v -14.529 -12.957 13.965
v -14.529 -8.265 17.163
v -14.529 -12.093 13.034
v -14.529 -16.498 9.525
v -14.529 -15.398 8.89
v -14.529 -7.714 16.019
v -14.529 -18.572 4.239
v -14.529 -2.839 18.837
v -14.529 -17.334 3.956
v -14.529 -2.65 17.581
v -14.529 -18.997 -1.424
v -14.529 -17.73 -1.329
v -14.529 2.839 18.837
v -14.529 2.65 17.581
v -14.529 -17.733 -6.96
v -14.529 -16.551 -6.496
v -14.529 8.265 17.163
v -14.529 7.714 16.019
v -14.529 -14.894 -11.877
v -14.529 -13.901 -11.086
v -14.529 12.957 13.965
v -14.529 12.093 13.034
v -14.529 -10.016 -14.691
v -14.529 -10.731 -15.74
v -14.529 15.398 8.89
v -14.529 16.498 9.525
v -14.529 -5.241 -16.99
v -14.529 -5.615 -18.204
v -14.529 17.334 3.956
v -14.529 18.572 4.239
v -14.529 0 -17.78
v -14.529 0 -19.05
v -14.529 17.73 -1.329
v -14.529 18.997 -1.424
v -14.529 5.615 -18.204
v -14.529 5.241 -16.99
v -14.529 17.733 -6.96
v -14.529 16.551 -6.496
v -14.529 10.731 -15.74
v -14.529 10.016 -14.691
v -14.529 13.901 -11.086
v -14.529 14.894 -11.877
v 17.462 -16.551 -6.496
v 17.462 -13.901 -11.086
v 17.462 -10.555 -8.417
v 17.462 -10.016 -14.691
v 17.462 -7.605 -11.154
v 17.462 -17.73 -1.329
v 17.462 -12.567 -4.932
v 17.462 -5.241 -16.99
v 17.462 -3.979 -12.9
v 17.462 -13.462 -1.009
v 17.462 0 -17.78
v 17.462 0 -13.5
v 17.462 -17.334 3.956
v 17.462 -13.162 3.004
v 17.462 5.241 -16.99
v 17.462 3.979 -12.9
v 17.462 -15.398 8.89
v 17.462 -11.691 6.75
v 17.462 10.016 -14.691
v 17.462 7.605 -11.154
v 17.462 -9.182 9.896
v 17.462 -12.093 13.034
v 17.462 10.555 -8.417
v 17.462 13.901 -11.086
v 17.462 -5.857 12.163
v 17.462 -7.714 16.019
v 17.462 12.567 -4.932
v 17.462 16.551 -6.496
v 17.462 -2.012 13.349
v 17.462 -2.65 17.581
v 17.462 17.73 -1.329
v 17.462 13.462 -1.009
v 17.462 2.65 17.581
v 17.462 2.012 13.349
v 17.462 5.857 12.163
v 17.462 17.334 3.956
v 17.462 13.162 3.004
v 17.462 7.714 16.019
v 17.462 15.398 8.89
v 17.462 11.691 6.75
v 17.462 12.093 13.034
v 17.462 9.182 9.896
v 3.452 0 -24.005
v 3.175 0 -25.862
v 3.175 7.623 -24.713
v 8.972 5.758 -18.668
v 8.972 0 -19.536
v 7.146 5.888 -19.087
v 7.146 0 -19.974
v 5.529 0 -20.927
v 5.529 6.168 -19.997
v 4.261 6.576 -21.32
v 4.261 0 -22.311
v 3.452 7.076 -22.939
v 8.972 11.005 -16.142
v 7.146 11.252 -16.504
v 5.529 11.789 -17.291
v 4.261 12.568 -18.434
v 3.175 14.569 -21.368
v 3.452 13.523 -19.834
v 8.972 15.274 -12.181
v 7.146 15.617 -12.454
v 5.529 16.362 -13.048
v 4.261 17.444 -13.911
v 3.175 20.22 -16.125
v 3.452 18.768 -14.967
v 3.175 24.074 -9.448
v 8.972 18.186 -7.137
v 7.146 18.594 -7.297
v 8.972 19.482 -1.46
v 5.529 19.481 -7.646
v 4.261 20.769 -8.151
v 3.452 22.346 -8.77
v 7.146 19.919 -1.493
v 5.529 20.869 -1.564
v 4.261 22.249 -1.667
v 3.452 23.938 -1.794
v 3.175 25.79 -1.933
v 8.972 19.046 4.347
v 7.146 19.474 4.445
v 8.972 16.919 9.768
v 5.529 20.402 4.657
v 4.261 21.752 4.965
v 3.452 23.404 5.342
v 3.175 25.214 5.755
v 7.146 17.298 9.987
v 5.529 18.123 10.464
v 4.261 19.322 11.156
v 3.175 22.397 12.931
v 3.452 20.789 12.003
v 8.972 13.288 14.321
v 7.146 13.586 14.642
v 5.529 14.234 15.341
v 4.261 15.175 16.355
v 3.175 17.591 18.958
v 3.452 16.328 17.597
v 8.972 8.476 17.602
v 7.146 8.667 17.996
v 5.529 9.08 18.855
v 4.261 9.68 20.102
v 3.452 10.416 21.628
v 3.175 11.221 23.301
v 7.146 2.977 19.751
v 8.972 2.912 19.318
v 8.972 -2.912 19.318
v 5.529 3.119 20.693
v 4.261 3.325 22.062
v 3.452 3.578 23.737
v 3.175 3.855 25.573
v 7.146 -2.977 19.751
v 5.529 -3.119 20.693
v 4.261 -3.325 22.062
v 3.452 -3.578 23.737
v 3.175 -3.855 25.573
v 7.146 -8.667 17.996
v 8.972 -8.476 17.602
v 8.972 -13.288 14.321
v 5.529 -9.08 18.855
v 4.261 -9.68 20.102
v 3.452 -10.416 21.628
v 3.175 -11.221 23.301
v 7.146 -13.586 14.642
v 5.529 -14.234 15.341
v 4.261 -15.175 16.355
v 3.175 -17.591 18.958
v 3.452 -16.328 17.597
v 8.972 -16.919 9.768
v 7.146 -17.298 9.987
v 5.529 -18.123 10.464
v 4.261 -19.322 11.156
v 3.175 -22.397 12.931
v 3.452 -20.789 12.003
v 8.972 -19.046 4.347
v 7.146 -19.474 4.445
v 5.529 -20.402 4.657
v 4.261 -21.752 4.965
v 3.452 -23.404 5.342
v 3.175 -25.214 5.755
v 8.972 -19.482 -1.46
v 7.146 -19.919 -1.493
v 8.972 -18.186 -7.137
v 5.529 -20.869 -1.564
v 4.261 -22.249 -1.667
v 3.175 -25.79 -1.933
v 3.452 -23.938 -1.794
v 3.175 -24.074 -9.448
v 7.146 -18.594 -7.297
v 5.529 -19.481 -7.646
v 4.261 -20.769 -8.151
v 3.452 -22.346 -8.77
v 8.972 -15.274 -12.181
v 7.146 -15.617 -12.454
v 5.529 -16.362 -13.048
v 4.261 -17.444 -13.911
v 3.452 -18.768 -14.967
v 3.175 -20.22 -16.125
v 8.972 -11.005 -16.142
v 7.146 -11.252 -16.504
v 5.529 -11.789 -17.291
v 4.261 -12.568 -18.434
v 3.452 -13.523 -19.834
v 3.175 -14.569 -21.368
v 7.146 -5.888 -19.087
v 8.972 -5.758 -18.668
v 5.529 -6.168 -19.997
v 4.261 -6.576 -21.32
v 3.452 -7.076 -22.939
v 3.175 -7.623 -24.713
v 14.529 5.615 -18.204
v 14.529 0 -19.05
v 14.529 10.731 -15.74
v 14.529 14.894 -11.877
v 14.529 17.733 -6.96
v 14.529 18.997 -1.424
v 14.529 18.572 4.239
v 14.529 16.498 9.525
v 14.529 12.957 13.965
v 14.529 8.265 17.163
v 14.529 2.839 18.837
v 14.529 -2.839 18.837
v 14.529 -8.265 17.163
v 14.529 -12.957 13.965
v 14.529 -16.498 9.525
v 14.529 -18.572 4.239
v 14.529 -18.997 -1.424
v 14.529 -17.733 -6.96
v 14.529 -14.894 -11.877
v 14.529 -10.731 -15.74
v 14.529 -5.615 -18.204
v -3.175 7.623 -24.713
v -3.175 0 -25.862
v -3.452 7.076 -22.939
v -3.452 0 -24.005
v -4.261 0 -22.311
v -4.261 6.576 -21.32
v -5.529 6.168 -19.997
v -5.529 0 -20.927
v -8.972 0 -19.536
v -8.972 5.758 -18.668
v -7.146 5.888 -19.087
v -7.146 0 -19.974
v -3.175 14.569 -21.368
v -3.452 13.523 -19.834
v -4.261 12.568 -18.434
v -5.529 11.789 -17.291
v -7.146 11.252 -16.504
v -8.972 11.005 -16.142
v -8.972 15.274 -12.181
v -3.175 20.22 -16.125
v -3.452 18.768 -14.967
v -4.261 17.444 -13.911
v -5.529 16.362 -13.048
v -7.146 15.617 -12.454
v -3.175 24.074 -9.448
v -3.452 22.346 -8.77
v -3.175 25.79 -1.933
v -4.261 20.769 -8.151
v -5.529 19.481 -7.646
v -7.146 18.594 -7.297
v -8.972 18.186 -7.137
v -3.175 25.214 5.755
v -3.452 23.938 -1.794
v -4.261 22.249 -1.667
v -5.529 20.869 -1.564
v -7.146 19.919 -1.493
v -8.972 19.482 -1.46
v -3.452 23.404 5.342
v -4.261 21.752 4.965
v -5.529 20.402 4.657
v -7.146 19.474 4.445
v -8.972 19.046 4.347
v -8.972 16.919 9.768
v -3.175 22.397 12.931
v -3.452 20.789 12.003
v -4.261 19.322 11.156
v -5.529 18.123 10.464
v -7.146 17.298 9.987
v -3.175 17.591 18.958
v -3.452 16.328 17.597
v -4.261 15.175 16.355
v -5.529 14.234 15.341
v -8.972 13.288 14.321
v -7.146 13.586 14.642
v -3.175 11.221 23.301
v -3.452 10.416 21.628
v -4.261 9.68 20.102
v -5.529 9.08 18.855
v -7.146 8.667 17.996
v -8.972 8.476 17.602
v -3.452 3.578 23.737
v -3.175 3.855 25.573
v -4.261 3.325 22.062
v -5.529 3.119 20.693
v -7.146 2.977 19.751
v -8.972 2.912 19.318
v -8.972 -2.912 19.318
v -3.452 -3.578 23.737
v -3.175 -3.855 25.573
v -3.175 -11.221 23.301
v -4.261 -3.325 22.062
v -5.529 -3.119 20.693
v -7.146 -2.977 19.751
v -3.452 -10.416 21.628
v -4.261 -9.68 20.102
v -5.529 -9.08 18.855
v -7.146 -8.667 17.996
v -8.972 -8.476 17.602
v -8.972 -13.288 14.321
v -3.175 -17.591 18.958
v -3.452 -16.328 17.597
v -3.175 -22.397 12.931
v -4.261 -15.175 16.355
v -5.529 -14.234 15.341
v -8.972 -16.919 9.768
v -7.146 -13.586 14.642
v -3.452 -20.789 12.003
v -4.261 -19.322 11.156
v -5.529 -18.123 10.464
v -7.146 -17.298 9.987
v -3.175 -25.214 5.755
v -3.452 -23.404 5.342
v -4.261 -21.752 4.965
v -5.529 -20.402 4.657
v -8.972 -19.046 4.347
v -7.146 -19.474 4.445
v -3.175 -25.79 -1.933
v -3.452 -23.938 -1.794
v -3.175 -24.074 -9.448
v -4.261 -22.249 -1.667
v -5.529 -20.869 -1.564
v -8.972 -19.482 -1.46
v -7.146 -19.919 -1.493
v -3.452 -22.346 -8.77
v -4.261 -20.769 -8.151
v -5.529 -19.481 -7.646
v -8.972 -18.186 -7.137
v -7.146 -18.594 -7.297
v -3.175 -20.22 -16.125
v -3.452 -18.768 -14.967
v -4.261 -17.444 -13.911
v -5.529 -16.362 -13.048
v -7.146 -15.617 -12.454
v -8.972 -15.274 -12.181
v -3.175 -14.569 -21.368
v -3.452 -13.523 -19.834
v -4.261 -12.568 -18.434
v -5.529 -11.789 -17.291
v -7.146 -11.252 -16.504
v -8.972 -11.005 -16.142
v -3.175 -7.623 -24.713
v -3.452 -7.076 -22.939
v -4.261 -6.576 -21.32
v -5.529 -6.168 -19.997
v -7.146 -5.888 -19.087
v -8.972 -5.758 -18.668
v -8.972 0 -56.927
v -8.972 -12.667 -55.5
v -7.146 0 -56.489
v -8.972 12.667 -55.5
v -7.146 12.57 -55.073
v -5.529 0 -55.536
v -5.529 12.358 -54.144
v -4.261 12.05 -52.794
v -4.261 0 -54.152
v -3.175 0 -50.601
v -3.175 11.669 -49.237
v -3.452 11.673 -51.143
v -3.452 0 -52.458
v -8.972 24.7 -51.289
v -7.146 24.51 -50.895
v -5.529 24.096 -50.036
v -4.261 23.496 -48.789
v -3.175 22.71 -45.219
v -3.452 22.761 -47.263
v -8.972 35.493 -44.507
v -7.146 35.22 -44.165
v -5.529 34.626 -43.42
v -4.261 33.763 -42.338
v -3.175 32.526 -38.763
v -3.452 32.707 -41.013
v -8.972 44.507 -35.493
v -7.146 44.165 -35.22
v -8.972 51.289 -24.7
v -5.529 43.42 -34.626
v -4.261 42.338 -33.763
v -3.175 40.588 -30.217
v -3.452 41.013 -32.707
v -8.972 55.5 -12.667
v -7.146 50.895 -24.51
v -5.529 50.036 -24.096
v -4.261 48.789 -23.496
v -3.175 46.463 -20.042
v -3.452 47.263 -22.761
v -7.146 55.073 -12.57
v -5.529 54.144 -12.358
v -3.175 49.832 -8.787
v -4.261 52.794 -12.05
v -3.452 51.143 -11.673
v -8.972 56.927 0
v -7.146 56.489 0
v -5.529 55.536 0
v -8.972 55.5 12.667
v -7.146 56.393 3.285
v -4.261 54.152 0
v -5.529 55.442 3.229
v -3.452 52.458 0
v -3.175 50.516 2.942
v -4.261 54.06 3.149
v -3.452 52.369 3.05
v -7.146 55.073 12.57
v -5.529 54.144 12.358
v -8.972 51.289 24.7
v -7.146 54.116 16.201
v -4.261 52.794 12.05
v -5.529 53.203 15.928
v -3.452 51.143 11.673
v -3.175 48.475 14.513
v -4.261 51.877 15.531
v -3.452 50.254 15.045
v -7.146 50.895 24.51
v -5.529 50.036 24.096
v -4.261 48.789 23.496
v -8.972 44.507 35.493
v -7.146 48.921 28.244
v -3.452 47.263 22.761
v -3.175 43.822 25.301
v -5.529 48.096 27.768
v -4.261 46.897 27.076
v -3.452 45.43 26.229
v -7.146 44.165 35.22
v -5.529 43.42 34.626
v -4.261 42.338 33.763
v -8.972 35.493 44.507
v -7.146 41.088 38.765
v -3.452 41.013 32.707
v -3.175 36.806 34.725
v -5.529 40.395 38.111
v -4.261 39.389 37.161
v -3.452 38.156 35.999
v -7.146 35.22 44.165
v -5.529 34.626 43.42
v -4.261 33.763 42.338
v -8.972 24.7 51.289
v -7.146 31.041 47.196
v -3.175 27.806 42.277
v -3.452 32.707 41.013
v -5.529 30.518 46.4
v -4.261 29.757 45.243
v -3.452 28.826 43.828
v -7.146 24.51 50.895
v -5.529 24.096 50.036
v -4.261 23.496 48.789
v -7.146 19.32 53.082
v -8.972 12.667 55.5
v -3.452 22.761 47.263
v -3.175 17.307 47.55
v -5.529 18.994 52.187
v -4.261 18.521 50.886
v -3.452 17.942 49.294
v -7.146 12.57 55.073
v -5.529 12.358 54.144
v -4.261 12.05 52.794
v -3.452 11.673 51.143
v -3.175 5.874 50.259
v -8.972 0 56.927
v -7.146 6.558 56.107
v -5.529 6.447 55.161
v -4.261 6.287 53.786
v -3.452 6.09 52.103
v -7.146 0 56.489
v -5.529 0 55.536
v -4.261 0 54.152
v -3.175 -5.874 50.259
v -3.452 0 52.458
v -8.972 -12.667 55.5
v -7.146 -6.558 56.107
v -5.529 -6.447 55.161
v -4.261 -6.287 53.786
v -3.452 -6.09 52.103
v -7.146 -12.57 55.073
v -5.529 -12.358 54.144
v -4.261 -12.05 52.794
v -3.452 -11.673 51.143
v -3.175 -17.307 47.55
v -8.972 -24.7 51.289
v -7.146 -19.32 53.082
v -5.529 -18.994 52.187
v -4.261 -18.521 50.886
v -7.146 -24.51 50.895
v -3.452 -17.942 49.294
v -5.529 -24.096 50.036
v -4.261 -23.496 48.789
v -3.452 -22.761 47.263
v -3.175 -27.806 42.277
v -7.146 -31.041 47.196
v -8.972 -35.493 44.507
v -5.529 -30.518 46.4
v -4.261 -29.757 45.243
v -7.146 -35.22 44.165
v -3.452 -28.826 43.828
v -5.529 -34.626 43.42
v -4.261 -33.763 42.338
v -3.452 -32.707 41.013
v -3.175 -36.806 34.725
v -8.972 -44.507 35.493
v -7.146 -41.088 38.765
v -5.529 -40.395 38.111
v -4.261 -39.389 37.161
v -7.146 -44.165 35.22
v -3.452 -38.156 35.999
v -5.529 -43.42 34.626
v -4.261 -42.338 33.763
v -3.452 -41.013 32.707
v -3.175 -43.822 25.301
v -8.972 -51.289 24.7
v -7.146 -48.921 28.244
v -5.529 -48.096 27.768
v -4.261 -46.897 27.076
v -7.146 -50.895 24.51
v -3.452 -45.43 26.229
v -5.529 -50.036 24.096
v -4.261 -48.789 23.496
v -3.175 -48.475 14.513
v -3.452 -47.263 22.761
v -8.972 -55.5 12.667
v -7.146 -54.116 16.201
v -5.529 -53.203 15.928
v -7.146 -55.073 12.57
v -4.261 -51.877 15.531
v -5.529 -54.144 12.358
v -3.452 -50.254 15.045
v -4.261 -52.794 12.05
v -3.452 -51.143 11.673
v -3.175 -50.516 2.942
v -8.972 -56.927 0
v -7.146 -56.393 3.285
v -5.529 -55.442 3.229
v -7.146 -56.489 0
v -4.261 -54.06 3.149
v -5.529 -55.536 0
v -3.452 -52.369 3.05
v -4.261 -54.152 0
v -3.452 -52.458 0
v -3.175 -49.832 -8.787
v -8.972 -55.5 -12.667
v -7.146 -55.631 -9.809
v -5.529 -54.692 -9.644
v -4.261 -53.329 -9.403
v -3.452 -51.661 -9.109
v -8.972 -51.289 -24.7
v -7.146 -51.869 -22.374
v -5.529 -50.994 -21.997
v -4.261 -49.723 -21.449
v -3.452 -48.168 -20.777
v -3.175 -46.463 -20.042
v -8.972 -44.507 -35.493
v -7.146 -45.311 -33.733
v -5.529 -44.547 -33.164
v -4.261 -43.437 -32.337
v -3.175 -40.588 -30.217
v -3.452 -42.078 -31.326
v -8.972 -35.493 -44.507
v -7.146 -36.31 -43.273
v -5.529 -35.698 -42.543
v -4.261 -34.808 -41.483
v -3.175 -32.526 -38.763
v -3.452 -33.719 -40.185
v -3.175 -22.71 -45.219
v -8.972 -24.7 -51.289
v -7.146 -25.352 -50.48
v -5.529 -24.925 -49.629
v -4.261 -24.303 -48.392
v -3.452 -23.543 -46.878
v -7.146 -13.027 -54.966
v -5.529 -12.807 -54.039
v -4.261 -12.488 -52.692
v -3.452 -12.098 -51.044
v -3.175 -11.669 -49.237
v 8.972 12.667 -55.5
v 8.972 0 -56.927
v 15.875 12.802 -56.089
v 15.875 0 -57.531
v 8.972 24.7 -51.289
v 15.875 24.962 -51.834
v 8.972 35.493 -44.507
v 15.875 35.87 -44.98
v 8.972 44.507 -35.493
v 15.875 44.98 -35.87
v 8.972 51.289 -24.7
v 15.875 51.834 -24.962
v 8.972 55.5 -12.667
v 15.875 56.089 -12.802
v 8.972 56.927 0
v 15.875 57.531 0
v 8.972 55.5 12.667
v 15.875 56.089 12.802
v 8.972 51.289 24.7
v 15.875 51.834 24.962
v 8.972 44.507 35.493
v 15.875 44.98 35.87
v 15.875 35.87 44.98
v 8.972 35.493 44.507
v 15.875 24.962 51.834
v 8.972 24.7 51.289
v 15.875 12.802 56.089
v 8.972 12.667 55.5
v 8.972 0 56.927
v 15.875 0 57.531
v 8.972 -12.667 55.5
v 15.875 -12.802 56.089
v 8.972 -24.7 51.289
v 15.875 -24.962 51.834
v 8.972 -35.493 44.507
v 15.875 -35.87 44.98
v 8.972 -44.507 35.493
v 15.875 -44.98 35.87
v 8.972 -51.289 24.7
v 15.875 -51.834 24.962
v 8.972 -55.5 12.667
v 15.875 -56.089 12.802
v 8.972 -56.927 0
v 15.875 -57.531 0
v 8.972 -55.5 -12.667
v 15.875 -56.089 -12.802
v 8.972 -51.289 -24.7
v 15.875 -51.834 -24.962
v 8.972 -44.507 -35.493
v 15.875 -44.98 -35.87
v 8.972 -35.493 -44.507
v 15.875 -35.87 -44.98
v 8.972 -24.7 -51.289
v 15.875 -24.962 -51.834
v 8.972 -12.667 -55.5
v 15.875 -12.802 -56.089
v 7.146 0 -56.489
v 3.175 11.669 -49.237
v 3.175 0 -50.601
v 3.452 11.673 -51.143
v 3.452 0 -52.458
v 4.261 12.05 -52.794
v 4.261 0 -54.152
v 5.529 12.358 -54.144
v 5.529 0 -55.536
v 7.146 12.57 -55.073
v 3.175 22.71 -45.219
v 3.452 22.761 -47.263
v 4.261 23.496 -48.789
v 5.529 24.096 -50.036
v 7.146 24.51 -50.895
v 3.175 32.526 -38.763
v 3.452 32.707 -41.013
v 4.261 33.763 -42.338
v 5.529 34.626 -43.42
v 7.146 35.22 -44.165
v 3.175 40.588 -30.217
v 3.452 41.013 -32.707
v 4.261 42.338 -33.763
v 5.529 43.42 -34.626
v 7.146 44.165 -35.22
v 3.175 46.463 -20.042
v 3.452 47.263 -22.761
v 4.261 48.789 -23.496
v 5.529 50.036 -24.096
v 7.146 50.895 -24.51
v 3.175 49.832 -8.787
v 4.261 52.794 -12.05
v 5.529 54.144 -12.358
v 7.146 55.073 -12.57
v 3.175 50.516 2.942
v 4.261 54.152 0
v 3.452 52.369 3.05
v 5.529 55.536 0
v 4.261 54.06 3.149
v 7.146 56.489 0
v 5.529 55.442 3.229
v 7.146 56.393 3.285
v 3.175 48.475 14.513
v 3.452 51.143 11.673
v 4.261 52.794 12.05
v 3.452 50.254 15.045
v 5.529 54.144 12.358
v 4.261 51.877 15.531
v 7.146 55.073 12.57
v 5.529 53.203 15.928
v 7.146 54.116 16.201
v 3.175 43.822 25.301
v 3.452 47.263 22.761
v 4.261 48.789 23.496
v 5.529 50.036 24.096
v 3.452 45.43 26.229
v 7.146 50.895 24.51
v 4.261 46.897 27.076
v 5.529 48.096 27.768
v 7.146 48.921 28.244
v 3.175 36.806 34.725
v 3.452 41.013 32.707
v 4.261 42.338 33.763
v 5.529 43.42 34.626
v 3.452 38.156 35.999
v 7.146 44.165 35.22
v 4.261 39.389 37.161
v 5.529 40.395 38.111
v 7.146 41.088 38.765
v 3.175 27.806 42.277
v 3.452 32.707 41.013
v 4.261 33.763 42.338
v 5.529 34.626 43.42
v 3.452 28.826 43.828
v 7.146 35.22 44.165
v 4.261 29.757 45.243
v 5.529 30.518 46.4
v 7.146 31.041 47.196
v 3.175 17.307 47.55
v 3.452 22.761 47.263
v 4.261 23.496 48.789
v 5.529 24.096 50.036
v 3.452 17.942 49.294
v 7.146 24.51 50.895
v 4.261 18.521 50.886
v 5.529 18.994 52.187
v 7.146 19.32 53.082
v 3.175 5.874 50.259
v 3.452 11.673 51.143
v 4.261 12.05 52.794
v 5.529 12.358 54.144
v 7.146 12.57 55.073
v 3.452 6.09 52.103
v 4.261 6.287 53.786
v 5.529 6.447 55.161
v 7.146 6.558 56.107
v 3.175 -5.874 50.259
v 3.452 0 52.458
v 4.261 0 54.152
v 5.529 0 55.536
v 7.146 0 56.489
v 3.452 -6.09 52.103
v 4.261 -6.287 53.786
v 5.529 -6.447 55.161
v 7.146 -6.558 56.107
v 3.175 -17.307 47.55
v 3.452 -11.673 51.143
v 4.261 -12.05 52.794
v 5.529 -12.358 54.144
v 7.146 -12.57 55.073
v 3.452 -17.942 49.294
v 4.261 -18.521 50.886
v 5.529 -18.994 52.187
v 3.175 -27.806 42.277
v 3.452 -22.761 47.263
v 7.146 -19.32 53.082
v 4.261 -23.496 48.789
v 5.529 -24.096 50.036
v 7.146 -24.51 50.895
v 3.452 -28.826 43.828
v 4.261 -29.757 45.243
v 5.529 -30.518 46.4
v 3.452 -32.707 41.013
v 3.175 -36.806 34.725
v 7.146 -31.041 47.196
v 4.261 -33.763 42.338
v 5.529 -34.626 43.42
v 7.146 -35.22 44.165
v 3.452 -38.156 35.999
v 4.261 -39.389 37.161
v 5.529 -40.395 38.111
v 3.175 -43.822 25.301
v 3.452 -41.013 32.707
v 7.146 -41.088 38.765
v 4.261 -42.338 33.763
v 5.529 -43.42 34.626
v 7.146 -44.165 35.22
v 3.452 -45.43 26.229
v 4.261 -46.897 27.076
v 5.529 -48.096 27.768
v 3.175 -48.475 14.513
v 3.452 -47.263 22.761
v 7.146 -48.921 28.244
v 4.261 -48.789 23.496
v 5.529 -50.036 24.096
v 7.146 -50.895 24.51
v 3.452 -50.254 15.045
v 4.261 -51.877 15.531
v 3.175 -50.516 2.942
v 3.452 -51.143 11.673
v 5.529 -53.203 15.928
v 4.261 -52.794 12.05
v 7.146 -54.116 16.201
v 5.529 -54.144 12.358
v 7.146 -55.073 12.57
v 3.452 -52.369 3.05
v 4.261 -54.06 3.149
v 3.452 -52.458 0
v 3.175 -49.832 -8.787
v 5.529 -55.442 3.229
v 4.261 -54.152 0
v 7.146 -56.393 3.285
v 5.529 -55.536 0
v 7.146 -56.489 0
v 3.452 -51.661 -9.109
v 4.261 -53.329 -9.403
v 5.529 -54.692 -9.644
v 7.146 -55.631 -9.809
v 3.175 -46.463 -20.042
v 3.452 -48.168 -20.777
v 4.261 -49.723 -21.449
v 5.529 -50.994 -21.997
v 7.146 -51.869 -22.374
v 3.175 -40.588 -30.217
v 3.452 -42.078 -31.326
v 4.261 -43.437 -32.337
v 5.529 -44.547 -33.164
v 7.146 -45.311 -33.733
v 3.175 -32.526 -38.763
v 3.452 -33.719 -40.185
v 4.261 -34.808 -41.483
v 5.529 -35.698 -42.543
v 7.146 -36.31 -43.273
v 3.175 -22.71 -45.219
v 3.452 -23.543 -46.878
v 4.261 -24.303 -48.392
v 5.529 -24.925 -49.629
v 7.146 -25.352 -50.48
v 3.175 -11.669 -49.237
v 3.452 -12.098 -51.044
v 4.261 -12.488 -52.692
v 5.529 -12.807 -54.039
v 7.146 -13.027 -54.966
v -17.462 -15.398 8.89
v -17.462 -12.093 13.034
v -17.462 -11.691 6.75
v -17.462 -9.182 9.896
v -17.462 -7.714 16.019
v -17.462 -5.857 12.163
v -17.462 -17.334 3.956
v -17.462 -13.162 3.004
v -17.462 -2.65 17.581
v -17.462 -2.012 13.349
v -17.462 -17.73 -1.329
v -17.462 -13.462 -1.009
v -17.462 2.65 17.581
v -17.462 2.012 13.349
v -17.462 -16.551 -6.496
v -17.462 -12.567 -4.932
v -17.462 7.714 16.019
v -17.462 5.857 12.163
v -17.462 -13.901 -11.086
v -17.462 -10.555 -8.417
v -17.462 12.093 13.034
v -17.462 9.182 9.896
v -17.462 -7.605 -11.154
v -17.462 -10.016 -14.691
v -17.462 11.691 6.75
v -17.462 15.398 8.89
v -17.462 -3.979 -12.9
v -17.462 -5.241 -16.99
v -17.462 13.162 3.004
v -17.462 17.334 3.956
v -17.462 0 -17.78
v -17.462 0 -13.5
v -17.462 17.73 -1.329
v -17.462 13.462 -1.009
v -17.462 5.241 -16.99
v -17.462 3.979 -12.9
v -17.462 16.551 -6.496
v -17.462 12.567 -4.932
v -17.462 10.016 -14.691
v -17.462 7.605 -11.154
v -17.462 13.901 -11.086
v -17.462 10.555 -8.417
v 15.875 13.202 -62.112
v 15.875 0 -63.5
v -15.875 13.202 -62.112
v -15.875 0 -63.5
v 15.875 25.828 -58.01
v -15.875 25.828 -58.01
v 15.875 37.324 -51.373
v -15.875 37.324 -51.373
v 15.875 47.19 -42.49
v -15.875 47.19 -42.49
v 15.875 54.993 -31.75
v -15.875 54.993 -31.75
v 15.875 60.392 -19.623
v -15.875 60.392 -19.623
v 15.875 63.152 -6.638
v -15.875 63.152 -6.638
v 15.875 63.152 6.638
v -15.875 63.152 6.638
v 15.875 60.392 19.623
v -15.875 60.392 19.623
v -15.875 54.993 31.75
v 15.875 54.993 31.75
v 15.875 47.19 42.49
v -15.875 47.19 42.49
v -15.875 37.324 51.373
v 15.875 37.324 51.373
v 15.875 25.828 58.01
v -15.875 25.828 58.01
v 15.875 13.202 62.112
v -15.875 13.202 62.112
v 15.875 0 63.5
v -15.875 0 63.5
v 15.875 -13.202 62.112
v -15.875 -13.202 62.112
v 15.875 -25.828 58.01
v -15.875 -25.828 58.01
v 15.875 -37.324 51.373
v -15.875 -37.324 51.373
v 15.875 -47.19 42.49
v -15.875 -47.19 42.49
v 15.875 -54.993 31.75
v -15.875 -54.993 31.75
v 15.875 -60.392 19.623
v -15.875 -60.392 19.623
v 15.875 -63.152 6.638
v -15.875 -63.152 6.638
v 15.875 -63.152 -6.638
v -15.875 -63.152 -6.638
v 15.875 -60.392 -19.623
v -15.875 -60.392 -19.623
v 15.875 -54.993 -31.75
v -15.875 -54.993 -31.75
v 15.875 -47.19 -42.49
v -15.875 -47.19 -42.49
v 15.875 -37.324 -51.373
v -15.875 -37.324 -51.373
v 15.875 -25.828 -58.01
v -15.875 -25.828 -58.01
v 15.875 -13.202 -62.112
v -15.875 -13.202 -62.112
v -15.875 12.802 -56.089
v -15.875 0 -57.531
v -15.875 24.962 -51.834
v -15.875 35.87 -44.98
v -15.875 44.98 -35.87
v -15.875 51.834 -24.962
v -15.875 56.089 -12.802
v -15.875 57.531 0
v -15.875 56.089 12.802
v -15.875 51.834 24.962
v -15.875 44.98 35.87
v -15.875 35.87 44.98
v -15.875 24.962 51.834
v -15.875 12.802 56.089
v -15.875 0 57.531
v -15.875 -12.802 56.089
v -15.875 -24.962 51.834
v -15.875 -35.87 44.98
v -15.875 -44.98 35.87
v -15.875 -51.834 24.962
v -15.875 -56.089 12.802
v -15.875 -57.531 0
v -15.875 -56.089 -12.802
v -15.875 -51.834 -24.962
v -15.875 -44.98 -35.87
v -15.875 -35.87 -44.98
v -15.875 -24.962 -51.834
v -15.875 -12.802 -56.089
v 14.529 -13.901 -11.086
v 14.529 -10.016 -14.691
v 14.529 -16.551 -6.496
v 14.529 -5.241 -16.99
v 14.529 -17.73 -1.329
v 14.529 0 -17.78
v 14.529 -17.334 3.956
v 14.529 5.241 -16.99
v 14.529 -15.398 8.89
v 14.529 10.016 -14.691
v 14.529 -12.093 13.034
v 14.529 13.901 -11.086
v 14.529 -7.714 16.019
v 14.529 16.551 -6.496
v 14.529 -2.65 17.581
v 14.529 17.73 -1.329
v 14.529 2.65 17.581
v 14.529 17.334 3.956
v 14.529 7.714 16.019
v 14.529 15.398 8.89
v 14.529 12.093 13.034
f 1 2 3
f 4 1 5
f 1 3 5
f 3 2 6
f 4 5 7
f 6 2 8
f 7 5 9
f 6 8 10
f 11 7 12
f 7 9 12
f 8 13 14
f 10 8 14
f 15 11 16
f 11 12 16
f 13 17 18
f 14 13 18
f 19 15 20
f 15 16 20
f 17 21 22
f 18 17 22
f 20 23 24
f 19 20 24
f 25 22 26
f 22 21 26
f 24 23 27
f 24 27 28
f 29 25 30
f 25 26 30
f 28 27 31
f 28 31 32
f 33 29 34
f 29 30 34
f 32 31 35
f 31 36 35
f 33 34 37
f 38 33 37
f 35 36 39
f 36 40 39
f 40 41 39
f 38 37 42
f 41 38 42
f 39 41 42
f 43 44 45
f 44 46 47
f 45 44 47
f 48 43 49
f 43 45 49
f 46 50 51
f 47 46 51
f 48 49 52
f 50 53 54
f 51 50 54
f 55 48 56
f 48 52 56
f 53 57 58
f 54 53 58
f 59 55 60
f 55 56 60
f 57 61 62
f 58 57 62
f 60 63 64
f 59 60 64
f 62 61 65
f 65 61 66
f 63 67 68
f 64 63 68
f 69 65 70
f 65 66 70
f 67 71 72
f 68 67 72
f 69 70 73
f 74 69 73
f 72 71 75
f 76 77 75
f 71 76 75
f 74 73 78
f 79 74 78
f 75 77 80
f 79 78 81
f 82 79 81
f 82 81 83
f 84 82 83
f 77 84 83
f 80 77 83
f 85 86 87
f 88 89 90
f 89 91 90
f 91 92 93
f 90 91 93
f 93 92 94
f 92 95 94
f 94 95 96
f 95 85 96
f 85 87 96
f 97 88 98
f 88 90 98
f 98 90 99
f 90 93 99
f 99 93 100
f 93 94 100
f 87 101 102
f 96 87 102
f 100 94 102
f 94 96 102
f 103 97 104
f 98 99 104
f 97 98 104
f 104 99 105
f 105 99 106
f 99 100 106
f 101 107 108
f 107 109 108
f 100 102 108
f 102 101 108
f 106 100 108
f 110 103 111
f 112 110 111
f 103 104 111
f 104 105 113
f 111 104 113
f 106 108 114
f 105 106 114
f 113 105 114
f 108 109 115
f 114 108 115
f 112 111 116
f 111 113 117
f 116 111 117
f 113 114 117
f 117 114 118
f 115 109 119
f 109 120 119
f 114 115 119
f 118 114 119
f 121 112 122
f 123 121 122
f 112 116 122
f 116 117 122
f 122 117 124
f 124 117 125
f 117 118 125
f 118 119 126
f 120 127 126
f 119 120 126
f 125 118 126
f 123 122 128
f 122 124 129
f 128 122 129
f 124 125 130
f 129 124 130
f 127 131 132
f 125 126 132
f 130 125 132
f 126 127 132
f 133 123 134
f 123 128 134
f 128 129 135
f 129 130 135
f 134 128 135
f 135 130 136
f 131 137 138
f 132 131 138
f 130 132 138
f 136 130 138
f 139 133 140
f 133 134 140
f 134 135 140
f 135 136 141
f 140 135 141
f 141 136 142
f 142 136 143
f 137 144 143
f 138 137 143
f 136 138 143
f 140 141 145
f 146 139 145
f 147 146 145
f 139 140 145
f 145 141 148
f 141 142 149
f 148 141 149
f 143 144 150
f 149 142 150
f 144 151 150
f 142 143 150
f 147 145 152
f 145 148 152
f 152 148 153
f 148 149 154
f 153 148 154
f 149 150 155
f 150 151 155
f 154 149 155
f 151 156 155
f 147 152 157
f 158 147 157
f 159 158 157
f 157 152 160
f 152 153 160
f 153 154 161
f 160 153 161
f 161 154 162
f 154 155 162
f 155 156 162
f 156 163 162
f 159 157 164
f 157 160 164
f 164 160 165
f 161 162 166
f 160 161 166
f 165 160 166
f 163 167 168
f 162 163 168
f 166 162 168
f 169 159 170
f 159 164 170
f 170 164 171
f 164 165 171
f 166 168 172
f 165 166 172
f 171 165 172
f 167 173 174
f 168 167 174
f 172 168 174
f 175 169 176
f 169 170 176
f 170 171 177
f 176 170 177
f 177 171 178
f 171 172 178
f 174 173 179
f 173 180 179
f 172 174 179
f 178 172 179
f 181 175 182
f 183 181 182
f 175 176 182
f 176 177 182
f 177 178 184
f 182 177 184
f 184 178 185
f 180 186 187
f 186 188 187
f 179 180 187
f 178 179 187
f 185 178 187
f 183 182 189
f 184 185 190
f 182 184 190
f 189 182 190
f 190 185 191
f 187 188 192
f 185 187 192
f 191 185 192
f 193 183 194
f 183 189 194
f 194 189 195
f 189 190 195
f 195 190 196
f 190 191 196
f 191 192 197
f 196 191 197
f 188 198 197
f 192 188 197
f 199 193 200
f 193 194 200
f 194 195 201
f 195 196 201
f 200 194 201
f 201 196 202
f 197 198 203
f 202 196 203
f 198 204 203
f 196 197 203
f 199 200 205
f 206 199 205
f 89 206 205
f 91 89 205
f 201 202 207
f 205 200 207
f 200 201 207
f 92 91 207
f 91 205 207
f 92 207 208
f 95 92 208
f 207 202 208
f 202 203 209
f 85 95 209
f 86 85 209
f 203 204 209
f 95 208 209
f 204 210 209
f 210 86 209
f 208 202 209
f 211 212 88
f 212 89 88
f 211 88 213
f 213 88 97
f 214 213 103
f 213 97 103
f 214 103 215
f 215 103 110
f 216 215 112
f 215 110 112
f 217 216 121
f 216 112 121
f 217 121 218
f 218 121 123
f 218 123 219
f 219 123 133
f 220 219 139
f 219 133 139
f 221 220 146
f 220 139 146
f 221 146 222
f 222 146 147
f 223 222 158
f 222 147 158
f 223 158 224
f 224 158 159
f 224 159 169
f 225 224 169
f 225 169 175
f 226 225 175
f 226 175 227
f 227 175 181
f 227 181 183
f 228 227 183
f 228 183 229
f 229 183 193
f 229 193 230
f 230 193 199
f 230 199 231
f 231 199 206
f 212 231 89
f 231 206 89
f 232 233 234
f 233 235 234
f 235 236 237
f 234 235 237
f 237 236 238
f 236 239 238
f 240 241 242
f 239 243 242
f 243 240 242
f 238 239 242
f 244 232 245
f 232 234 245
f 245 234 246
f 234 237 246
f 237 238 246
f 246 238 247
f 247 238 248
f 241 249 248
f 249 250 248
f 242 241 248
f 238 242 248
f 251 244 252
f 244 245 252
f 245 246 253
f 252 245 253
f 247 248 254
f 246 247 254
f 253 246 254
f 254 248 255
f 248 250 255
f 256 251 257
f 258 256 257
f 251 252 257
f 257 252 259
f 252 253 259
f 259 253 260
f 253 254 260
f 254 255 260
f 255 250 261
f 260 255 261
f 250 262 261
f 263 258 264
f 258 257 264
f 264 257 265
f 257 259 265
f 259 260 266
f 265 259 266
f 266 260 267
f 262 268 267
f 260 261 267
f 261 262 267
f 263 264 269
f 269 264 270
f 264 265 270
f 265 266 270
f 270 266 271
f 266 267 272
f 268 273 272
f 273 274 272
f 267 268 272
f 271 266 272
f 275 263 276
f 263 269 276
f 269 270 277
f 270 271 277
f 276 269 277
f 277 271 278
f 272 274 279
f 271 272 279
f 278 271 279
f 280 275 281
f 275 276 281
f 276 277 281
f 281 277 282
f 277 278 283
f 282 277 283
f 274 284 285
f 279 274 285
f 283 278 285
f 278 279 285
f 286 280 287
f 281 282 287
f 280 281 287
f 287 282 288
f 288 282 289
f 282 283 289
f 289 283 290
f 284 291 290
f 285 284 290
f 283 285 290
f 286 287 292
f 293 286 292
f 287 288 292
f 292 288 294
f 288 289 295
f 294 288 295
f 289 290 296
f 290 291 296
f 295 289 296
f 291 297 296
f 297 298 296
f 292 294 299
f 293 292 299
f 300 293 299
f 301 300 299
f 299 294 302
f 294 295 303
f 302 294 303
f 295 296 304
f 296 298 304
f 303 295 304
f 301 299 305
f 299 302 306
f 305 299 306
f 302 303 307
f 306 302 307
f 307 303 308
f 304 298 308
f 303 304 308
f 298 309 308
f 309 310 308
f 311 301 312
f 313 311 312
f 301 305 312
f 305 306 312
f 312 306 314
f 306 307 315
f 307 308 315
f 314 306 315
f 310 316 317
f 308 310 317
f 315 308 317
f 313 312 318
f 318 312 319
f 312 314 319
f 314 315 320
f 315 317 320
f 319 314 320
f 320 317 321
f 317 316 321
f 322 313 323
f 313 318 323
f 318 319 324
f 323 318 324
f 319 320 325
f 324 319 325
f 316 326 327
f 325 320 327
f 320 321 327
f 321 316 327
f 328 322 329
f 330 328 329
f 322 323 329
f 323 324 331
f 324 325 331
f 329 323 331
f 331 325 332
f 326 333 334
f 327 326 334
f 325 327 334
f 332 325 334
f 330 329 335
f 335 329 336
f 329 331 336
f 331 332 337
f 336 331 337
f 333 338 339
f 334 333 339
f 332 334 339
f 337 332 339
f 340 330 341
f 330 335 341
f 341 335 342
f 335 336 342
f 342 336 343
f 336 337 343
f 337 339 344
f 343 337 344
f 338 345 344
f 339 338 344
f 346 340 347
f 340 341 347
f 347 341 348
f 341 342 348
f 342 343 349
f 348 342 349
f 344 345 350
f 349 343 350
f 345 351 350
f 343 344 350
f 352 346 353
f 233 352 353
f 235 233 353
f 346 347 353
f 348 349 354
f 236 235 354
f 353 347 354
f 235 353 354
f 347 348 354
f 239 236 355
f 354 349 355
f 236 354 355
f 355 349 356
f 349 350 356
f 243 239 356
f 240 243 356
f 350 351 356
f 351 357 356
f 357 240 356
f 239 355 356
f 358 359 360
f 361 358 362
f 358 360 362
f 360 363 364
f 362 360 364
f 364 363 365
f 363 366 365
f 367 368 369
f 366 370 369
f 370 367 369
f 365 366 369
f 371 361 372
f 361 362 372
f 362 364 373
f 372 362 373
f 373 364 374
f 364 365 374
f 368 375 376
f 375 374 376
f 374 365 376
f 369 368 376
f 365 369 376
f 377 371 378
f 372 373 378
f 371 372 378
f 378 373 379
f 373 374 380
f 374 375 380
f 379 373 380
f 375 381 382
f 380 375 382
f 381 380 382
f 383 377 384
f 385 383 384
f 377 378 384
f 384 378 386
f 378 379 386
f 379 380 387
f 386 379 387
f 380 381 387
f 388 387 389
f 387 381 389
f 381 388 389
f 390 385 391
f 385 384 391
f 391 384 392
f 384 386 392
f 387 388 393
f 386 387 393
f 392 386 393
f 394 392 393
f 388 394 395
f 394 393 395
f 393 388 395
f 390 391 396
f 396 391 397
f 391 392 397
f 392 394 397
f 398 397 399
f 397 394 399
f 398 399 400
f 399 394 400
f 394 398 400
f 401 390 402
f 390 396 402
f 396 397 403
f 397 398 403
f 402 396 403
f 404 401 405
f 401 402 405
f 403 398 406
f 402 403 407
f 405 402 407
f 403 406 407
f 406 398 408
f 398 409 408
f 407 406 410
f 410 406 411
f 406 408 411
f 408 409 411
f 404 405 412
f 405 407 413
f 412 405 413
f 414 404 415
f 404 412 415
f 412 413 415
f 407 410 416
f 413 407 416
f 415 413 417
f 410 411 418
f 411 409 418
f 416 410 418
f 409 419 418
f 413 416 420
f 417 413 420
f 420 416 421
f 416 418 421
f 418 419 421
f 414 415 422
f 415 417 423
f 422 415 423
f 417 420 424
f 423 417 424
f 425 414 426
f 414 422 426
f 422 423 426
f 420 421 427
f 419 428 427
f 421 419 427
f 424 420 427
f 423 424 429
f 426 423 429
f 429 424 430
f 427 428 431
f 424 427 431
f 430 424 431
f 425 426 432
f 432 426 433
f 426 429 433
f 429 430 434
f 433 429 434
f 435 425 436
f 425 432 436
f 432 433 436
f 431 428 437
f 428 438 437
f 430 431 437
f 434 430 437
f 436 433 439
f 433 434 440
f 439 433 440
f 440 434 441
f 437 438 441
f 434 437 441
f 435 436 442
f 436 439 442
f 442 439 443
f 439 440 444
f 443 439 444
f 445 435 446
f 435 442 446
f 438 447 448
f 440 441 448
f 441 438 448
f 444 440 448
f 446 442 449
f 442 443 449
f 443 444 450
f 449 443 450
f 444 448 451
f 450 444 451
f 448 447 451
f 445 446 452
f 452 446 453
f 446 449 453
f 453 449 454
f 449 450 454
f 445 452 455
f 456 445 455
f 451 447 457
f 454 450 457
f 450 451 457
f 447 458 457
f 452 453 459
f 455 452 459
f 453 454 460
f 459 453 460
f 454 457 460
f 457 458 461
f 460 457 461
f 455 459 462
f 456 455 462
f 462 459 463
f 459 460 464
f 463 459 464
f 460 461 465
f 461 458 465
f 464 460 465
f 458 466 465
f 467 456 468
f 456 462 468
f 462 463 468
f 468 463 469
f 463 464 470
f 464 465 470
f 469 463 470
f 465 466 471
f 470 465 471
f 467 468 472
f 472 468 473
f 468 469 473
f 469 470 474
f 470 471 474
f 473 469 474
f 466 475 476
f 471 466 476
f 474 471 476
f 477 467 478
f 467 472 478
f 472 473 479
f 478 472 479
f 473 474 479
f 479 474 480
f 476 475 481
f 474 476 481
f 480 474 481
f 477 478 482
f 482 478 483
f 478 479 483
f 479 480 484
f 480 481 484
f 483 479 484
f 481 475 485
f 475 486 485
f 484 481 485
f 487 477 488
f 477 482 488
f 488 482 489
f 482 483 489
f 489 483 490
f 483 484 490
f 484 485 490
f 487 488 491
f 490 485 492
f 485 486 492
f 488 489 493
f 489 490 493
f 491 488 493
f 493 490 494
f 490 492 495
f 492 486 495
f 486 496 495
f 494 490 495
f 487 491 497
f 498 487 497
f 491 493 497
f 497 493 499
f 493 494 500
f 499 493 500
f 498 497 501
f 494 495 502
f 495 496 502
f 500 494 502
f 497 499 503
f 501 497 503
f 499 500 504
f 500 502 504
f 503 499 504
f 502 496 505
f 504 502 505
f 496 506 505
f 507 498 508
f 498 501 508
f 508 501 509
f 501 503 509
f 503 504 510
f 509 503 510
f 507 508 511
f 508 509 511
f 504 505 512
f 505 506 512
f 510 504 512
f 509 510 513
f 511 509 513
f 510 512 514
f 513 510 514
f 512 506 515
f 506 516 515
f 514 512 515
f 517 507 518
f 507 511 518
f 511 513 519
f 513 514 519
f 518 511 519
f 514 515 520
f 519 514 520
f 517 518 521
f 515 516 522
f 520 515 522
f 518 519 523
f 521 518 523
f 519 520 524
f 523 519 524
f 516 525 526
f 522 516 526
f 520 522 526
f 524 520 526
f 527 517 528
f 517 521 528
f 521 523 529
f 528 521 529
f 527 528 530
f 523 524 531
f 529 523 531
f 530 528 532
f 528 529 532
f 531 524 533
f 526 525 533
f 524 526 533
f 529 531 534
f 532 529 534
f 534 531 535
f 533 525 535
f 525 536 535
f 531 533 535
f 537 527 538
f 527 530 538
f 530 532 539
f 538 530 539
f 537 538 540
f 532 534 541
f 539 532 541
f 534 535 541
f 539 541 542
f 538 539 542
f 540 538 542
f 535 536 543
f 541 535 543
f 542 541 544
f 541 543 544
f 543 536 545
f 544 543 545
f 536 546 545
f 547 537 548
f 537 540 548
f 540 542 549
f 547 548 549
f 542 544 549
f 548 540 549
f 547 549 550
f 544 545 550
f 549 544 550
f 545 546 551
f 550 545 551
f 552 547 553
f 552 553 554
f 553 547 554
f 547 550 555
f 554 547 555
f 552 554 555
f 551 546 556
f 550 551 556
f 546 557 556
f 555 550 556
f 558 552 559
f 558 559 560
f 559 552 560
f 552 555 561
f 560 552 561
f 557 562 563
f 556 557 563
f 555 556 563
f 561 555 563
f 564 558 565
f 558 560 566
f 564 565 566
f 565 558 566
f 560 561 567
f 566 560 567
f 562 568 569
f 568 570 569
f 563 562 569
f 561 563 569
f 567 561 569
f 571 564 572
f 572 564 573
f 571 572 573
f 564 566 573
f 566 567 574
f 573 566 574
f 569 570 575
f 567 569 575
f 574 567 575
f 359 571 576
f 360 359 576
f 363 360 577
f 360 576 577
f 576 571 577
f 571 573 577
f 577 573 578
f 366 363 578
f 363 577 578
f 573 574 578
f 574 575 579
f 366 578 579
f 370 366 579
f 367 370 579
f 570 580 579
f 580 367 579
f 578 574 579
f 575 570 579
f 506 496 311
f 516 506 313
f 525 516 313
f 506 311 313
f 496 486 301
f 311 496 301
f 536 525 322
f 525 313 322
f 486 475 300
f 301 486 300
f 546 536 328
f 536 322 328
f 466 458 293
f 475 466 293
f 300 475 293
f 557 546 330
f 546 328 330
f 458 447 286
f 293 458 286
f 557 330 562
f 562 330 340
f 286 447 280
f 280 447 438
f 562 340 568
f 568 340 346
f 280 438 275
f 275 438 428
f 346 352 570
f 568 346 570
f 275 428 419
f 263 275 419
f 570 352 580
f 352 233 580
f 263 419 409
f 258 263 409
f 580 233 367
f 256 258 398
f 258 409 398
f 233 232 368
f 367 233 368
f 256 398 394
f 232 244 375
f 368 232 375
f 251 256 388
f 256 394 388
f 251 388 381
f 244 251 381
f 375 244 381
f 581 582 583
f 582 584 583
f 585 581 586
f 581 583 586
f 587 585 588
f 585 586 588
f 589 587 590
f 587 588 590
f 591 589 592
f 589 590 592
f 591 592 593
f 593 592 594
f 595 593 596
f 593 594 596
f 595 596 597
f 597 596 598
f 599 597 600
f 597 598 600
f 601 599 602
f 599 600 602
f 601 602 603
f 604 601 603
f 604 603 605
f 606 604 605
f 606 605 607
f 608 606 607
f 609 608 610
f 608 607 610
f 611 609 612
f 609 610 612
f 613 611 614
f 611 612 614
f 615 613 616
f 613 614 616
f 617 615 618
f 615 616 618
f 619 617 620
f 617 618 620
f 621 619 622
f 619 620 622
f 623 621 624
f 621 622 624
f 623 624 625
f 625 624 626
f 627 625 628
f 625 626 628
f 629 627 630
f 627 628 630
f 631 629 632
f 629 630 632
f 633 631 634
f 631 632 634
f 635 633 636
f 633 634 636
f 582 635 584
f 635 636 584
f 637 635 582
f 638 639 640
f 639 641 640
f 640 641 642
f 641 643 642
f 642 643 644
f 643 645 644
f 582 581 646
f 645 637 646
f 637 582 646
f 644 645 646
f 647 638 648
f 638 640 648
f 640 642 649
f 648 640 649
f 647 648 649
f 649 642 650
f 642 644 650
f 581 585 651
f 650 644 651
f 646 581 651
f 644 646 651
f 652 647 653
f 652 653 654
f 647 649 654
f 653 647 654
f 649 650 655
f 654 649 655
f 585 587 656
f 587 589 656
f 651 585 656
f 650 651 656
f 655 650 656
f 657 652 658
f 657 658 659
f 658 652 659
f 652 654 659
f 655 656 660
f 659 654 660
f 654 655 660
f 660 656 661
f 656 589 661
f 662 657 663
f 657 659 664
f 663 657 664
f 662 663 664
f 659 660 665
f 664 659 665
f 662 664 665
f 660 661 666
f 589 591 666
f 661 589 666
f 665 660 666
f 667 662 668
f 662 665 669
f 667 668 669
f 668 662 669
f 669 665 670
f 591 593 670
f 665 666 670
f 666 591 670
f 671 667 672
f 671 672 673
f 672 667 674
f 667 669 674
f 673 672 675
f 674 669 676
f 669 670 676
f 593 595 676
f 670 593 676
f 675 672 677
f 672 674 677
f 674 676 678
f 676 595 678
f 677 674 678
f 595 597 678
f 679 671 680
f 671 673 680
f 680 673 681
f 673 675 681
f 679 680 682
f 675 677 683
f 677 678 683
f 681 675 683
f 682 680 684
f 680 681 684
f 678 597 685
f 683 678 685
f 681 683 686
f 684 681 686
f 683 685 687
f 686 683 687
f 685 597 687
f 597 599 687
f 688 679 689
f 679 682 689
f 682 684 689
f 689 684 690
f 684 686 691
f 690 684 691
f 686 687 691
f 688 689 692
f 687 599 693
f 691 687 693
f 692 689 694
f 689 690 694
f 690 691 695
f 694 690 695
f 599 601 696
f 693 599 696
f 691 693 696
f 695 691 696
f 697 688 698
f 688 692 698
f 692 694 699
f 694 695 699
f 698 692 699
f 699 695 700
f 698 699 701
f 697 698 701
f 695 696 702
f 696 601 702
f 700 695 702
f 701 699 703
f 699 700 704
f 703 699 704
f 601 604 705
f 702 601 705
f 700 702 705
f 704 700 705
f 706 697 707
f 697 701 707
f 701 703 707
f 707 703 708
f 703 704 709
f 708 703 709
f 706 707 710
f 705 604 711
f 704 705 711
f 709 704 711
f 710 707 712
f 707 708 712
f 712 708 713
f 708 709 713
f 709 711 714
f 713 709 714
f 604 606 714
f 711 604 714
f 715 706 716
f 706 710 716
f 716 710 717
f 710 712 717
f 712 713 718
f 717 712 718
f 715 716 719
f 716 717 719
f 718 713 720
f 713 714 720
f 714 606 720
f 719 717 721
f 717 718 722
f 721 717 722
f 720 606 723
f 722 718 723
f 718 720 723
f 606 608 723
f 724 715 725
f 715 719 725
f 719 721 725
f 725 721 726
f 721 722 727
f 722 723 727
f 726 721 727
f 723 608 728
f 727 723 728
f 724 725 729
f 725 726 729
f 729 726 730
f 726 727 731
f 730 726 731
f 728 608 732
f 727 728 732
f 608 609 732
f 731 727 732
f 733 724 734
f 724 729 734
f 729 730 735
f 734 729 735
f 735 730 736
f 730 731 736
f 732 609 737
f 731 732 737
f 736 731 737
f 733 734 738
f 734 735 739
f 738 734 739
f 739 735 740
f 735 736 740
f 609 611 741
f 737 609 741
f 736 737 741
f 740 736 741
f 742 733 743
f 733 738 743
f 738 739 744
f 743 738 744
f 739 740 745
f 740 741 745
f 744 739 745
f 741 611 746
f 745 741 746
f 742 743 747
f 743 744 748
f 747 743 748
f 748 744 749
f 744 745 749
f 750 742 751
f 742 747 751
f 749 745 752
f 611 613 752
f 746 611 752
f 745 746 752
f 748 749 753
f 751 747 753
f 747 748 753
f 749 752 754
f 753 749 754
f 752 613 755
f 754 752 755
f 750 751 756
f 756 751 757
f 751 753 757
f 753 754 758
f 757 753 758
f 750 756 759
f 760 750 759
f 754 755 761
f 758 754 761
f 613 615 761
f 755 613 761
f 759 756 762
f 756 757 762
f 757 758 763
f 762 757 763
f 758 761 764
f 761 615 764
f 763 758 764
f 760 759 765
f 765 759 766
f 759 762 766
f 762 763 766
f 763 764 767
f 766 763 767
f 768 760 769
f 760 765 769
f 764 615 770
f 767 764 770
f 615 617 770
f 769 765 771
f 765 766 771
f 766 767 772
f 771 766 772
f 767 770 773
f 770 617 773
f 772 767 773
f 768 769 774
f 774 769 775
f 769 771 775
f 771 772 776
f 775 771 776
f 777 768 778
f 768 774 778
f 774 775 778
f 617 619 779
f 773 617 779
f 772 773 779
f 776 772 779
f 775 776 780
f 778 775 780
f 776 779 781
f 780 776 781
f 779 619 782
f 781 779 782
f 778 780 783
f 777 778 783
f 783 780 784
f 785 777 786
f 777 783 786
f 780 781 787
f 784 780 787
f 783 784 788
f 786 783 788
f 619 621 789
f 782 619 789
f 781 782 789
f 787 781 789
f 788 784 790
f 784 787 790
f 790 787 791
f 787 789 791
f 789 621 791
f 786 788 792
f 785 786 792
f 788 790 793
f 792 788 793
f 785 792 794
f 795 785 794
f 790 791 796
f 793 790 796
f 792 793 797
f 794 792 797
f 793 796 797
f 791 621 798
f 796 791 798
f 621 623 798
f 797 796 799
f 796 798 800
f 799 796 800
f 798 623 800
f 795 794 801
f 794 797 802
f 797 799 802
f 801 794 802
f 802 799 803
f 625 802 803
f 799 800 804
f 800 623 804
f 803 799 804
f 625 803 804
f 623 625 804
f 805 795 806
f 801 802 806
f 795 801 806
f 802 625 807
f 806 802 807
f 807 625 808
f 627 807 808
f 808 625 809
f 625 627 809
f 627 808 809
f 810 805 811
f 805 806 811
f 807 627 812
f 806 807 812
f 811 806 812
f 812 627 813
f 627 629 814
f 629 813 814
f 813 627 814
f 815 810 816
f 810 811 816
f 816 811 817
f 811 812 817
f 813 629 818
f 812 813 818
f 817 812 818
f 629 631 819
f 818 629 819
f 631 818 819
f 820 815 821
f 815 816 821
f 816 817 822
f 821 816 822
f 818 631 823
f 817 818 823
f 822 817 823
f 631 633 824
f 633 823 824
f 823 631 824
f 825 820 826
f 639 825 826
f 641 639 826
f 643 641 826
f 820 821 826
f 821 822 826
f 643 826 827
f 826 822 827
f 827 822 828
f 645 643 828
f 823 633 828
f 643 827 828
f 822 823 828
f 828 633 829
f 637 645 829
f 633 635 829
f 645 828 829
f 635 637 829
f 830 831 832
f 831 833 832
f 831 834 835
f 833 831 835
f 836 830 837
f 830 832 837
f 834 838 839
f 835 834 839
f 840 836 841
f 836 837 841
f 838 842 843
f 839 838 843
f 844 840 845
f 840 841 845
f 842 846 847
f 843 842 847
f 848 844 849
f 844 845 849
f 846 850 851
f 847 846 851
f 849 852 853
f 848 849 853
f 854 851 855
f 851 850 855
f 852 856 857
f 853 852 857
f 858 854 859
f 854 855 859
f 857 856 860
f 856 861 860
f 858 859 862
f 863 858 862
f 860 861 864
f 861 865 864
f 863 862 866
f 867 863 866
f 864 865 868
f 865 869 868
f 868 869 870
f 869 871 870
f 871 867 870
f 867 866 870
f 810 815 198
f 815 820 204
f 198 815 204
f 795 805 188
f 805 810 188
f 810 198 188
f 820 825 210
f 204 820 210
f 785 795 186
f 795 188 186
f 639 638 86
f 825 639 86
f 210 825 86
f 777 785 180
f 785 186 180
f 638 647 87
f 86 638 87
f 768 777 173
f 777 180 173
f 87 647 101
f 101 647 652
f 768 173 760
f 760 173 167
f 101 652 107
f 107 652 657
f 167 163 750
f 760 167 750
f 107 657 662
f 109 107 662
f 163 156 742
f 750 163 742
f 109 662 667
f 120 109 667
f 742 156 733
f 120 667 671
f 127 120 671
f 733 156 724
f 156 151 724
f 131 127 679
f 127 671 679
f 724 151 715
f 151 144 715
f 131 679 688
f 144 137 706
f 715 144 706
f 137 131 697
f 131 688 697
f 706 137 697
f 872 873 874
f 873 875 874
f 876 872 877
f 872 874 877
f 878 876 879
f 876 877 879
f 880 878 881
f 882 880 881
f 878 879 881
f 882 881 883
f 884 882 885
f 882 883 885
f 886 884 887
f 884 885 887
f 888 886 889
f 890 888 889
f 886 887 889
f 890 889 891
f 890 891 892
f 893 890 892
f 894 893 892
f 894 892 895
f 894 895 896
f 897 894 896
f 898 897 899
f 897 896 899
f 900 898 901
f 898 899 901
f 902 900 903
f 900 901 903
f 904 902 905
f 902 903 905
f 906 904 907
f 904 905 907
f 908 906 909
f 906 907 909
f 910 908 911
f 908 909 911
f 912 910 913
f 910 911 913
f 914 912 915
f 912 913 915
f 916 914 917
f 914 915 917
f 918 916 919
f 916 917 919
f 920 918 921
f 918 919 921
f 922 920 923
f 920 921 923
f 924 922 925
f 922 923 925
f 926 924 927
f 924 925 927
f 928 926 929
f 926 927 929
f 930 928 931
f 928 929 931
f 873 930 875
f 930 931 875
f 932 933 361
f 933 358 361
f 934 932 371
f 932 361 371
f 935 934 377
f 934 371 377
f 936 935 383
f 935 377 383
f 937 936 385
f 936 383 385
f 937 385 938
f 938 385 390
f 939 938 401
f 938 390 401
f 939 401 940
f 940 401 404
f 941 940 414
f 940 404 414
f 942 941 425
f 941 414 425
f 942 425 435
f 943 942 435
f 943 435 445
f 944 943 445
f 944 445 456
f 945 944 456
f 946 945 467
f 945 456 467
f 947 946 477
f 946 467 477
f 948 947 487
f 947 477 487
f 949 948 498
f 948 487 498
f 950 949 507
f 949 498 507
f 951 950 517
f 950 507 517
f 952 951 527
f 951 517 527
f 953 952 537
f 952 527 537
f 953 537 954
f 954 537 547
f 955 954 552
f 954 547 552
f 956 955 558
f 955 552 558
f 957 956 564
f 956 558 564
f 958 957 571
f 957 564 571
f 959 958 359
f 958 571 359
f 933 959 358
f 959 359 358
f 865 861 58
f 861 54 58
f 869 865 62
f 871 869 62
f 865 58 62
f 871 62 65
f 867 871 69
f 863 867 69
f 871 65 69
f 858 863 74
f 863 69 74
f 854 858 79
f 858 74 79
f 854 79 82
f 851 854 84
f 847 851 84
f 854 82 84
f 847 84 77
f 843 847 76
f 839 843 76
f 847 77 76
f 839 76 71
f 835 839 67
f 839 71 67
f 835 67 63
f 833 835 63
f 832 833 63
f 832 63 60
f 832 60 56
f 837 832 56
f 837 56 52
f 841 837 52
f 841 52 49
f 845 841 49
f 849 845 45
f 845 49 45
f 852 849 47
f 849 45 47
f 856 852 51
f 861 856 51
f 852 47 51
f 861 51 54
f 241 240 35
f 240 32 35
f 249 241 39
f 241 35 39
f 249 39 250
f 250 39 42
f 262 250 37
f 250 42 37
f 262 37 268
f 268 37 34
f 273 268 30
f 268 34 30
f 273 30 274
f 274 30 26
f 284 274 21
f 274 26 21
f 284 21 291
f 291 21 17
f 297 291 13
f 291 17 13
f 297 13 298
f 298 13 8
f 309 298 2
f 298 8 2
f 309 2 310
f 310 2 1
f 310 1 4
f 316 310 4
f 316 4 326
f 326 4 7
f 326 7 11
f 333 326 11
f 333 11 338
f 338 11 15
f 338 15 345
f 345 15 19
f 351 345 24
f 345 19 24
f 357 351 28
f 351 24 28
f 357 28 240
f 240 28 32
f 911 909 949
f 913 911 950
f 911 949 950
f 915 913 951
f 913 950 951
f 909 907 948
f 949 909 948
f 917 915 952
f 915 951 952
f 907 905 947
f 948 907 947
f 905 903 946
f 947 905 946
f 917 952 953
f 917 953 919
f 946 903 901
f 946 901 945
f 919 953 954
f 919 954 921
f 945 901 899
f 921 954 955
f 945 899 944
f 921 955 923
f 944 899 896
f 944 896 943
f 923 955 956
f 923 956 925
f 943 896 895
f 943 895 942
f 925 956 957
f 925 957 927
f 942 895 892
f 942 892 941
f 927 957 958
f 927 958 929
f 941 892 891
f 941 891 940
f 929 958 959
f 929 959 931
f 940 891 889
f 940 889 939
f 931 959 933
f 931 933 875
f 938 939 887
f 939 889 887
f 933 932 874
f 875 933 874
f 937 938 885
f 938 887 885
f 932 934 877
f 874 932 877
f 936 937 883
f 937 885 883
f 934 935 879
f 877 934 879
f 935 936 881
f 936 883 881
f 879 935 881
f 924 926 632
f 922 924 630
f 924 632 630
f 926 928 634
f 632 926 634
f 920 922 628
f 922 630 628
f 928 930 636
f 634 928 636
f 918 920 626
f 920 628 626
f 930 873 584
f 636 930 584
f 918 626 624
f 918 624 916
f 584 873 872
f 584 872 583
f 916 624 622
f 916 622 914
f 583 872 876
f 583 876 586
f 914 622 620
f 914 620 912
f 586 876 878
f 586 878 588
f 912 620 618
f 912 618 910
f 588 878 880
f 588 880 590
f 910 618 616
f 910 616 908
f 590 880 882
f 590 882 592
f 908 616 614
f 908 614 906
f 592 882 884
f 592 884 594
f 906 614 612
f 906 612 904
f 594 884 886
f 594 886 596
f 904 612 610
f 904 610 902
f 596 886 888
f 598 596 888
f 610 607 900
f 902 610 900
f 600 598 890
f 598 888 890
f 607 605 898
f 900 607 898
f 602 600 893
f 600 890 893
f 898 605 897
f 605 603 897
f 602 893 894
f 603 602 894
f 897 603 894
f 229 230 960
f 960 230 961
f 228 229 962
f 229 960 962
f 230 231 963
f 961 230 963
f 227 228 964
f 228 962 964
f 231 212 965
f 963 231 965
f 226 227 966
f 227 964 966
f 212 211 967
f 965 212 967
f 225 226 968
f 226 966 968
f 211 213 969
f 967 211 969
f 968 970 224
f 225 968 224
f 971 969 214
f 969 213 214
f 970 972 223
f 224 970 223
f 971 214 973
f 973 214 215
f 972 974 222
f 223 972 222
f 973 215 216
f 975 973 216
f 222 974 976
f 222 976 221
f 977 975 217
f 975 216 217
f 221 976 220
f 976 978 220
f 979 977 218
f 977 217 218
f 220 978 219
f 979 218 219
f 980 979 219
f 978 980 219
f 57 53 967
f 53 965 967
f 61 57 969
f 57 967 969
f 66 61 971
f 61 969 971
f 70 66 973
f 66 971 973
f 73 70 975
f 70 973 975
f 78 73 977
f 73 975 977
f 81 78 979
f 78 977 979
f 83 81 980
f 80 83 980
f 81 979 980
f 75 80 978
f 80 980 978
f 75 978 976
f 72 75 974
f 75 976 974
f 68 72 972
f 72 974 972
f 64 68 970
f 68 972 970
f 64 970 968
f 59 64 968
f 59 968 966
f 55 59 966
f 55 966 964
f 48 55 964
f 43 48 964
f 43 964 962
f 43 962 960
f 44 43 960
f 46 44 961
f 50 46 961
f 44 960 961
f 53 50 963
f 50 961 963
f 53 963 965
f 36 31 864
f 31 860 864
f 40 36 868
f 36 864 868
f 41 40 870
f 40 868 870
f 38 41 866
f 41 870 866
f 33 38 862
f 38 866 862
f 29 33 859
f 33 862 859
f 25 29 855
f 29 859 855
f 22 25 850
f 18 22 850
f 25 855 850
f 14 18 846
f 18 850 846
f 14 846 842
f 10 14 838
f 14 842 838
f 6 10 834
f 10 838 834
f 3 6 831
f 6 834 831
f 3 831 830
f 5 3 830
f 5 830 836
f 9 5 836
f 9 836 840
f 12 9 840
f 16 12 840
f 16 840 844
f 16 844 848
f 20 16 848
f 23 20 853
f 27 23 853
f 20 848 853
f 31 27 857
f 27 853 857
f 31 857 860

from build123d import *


with BuildPart() as part:
    # Esboço1 → Revolução1 (revolve)
    with BuildSketch(Plane.XY, mode=Mode.PRIVATE) as revolu_o1_sk:
        with BuildLine():
            Line((-14.5288, 17.78), (-17.4625, 17.78))
            Line((-17.4625, 17.78), (-17.4625, 13.5001))
            Line((-17.4625, 13.5001), (17.4625, 13.5001))
            Line((17.4625, 13.5001), (17.4625, 17.78))
            Line((17.4625, 17.78), (14.5288, 17.78))
            Line((14.5288, 17.78), (14.5288, 19.05))
            Line((14.5288, 19.05), (8.971561034, 19.53619541))
            ThreePointArc((8.971561034, 19.53619541), (4.843288911, 21.572033925), (3.175, 25.862031743))
            Line((3.175, 25.862031743), (3.175, 50.601191018))
            ThreePointArc((3.175, 50.601191018), (4.843288911, 54.891188837), (8.971561034, 56.927027351))
            Line((8.971561034, 56.927027351), (15.875, 57.531))
            Line((15.875, 57.531), (15.875, 63.5))
            Line((15.875, 63.5), (-15.875, 63.5))
            Line((-15.875, 63.5), (-15.875, 57.531))
            Line((-15.875, 57.531), (-8.971561034, 56.927027351))
            ThreePointArc((-8.971561034, 56.927027351), (-4.843288911, 54.891188837), (-3.175, 50.601191018))
            Line((-3.175, 50.601191018), (-3.175, 25.862031743))
            ThreePointArc((-3.175, 25.862031743), (-4.843288911, 21.572033925), (-8.971561034, 19.53619541))
            Line((-8.971561034, 19.53619541), (-14.5288, 19.05))
            Line((-14.5288, 19.05), (-14.5288, 17.78))
        make_face()
    revolve(revolu_o1_sk.sketch.rotate(Axis((-17.4625, 0, 0), (1, 0, 0)), 270), axis=Axis((-17.4625, 0, 0), (1, 0, 0)))


solid = part.part
